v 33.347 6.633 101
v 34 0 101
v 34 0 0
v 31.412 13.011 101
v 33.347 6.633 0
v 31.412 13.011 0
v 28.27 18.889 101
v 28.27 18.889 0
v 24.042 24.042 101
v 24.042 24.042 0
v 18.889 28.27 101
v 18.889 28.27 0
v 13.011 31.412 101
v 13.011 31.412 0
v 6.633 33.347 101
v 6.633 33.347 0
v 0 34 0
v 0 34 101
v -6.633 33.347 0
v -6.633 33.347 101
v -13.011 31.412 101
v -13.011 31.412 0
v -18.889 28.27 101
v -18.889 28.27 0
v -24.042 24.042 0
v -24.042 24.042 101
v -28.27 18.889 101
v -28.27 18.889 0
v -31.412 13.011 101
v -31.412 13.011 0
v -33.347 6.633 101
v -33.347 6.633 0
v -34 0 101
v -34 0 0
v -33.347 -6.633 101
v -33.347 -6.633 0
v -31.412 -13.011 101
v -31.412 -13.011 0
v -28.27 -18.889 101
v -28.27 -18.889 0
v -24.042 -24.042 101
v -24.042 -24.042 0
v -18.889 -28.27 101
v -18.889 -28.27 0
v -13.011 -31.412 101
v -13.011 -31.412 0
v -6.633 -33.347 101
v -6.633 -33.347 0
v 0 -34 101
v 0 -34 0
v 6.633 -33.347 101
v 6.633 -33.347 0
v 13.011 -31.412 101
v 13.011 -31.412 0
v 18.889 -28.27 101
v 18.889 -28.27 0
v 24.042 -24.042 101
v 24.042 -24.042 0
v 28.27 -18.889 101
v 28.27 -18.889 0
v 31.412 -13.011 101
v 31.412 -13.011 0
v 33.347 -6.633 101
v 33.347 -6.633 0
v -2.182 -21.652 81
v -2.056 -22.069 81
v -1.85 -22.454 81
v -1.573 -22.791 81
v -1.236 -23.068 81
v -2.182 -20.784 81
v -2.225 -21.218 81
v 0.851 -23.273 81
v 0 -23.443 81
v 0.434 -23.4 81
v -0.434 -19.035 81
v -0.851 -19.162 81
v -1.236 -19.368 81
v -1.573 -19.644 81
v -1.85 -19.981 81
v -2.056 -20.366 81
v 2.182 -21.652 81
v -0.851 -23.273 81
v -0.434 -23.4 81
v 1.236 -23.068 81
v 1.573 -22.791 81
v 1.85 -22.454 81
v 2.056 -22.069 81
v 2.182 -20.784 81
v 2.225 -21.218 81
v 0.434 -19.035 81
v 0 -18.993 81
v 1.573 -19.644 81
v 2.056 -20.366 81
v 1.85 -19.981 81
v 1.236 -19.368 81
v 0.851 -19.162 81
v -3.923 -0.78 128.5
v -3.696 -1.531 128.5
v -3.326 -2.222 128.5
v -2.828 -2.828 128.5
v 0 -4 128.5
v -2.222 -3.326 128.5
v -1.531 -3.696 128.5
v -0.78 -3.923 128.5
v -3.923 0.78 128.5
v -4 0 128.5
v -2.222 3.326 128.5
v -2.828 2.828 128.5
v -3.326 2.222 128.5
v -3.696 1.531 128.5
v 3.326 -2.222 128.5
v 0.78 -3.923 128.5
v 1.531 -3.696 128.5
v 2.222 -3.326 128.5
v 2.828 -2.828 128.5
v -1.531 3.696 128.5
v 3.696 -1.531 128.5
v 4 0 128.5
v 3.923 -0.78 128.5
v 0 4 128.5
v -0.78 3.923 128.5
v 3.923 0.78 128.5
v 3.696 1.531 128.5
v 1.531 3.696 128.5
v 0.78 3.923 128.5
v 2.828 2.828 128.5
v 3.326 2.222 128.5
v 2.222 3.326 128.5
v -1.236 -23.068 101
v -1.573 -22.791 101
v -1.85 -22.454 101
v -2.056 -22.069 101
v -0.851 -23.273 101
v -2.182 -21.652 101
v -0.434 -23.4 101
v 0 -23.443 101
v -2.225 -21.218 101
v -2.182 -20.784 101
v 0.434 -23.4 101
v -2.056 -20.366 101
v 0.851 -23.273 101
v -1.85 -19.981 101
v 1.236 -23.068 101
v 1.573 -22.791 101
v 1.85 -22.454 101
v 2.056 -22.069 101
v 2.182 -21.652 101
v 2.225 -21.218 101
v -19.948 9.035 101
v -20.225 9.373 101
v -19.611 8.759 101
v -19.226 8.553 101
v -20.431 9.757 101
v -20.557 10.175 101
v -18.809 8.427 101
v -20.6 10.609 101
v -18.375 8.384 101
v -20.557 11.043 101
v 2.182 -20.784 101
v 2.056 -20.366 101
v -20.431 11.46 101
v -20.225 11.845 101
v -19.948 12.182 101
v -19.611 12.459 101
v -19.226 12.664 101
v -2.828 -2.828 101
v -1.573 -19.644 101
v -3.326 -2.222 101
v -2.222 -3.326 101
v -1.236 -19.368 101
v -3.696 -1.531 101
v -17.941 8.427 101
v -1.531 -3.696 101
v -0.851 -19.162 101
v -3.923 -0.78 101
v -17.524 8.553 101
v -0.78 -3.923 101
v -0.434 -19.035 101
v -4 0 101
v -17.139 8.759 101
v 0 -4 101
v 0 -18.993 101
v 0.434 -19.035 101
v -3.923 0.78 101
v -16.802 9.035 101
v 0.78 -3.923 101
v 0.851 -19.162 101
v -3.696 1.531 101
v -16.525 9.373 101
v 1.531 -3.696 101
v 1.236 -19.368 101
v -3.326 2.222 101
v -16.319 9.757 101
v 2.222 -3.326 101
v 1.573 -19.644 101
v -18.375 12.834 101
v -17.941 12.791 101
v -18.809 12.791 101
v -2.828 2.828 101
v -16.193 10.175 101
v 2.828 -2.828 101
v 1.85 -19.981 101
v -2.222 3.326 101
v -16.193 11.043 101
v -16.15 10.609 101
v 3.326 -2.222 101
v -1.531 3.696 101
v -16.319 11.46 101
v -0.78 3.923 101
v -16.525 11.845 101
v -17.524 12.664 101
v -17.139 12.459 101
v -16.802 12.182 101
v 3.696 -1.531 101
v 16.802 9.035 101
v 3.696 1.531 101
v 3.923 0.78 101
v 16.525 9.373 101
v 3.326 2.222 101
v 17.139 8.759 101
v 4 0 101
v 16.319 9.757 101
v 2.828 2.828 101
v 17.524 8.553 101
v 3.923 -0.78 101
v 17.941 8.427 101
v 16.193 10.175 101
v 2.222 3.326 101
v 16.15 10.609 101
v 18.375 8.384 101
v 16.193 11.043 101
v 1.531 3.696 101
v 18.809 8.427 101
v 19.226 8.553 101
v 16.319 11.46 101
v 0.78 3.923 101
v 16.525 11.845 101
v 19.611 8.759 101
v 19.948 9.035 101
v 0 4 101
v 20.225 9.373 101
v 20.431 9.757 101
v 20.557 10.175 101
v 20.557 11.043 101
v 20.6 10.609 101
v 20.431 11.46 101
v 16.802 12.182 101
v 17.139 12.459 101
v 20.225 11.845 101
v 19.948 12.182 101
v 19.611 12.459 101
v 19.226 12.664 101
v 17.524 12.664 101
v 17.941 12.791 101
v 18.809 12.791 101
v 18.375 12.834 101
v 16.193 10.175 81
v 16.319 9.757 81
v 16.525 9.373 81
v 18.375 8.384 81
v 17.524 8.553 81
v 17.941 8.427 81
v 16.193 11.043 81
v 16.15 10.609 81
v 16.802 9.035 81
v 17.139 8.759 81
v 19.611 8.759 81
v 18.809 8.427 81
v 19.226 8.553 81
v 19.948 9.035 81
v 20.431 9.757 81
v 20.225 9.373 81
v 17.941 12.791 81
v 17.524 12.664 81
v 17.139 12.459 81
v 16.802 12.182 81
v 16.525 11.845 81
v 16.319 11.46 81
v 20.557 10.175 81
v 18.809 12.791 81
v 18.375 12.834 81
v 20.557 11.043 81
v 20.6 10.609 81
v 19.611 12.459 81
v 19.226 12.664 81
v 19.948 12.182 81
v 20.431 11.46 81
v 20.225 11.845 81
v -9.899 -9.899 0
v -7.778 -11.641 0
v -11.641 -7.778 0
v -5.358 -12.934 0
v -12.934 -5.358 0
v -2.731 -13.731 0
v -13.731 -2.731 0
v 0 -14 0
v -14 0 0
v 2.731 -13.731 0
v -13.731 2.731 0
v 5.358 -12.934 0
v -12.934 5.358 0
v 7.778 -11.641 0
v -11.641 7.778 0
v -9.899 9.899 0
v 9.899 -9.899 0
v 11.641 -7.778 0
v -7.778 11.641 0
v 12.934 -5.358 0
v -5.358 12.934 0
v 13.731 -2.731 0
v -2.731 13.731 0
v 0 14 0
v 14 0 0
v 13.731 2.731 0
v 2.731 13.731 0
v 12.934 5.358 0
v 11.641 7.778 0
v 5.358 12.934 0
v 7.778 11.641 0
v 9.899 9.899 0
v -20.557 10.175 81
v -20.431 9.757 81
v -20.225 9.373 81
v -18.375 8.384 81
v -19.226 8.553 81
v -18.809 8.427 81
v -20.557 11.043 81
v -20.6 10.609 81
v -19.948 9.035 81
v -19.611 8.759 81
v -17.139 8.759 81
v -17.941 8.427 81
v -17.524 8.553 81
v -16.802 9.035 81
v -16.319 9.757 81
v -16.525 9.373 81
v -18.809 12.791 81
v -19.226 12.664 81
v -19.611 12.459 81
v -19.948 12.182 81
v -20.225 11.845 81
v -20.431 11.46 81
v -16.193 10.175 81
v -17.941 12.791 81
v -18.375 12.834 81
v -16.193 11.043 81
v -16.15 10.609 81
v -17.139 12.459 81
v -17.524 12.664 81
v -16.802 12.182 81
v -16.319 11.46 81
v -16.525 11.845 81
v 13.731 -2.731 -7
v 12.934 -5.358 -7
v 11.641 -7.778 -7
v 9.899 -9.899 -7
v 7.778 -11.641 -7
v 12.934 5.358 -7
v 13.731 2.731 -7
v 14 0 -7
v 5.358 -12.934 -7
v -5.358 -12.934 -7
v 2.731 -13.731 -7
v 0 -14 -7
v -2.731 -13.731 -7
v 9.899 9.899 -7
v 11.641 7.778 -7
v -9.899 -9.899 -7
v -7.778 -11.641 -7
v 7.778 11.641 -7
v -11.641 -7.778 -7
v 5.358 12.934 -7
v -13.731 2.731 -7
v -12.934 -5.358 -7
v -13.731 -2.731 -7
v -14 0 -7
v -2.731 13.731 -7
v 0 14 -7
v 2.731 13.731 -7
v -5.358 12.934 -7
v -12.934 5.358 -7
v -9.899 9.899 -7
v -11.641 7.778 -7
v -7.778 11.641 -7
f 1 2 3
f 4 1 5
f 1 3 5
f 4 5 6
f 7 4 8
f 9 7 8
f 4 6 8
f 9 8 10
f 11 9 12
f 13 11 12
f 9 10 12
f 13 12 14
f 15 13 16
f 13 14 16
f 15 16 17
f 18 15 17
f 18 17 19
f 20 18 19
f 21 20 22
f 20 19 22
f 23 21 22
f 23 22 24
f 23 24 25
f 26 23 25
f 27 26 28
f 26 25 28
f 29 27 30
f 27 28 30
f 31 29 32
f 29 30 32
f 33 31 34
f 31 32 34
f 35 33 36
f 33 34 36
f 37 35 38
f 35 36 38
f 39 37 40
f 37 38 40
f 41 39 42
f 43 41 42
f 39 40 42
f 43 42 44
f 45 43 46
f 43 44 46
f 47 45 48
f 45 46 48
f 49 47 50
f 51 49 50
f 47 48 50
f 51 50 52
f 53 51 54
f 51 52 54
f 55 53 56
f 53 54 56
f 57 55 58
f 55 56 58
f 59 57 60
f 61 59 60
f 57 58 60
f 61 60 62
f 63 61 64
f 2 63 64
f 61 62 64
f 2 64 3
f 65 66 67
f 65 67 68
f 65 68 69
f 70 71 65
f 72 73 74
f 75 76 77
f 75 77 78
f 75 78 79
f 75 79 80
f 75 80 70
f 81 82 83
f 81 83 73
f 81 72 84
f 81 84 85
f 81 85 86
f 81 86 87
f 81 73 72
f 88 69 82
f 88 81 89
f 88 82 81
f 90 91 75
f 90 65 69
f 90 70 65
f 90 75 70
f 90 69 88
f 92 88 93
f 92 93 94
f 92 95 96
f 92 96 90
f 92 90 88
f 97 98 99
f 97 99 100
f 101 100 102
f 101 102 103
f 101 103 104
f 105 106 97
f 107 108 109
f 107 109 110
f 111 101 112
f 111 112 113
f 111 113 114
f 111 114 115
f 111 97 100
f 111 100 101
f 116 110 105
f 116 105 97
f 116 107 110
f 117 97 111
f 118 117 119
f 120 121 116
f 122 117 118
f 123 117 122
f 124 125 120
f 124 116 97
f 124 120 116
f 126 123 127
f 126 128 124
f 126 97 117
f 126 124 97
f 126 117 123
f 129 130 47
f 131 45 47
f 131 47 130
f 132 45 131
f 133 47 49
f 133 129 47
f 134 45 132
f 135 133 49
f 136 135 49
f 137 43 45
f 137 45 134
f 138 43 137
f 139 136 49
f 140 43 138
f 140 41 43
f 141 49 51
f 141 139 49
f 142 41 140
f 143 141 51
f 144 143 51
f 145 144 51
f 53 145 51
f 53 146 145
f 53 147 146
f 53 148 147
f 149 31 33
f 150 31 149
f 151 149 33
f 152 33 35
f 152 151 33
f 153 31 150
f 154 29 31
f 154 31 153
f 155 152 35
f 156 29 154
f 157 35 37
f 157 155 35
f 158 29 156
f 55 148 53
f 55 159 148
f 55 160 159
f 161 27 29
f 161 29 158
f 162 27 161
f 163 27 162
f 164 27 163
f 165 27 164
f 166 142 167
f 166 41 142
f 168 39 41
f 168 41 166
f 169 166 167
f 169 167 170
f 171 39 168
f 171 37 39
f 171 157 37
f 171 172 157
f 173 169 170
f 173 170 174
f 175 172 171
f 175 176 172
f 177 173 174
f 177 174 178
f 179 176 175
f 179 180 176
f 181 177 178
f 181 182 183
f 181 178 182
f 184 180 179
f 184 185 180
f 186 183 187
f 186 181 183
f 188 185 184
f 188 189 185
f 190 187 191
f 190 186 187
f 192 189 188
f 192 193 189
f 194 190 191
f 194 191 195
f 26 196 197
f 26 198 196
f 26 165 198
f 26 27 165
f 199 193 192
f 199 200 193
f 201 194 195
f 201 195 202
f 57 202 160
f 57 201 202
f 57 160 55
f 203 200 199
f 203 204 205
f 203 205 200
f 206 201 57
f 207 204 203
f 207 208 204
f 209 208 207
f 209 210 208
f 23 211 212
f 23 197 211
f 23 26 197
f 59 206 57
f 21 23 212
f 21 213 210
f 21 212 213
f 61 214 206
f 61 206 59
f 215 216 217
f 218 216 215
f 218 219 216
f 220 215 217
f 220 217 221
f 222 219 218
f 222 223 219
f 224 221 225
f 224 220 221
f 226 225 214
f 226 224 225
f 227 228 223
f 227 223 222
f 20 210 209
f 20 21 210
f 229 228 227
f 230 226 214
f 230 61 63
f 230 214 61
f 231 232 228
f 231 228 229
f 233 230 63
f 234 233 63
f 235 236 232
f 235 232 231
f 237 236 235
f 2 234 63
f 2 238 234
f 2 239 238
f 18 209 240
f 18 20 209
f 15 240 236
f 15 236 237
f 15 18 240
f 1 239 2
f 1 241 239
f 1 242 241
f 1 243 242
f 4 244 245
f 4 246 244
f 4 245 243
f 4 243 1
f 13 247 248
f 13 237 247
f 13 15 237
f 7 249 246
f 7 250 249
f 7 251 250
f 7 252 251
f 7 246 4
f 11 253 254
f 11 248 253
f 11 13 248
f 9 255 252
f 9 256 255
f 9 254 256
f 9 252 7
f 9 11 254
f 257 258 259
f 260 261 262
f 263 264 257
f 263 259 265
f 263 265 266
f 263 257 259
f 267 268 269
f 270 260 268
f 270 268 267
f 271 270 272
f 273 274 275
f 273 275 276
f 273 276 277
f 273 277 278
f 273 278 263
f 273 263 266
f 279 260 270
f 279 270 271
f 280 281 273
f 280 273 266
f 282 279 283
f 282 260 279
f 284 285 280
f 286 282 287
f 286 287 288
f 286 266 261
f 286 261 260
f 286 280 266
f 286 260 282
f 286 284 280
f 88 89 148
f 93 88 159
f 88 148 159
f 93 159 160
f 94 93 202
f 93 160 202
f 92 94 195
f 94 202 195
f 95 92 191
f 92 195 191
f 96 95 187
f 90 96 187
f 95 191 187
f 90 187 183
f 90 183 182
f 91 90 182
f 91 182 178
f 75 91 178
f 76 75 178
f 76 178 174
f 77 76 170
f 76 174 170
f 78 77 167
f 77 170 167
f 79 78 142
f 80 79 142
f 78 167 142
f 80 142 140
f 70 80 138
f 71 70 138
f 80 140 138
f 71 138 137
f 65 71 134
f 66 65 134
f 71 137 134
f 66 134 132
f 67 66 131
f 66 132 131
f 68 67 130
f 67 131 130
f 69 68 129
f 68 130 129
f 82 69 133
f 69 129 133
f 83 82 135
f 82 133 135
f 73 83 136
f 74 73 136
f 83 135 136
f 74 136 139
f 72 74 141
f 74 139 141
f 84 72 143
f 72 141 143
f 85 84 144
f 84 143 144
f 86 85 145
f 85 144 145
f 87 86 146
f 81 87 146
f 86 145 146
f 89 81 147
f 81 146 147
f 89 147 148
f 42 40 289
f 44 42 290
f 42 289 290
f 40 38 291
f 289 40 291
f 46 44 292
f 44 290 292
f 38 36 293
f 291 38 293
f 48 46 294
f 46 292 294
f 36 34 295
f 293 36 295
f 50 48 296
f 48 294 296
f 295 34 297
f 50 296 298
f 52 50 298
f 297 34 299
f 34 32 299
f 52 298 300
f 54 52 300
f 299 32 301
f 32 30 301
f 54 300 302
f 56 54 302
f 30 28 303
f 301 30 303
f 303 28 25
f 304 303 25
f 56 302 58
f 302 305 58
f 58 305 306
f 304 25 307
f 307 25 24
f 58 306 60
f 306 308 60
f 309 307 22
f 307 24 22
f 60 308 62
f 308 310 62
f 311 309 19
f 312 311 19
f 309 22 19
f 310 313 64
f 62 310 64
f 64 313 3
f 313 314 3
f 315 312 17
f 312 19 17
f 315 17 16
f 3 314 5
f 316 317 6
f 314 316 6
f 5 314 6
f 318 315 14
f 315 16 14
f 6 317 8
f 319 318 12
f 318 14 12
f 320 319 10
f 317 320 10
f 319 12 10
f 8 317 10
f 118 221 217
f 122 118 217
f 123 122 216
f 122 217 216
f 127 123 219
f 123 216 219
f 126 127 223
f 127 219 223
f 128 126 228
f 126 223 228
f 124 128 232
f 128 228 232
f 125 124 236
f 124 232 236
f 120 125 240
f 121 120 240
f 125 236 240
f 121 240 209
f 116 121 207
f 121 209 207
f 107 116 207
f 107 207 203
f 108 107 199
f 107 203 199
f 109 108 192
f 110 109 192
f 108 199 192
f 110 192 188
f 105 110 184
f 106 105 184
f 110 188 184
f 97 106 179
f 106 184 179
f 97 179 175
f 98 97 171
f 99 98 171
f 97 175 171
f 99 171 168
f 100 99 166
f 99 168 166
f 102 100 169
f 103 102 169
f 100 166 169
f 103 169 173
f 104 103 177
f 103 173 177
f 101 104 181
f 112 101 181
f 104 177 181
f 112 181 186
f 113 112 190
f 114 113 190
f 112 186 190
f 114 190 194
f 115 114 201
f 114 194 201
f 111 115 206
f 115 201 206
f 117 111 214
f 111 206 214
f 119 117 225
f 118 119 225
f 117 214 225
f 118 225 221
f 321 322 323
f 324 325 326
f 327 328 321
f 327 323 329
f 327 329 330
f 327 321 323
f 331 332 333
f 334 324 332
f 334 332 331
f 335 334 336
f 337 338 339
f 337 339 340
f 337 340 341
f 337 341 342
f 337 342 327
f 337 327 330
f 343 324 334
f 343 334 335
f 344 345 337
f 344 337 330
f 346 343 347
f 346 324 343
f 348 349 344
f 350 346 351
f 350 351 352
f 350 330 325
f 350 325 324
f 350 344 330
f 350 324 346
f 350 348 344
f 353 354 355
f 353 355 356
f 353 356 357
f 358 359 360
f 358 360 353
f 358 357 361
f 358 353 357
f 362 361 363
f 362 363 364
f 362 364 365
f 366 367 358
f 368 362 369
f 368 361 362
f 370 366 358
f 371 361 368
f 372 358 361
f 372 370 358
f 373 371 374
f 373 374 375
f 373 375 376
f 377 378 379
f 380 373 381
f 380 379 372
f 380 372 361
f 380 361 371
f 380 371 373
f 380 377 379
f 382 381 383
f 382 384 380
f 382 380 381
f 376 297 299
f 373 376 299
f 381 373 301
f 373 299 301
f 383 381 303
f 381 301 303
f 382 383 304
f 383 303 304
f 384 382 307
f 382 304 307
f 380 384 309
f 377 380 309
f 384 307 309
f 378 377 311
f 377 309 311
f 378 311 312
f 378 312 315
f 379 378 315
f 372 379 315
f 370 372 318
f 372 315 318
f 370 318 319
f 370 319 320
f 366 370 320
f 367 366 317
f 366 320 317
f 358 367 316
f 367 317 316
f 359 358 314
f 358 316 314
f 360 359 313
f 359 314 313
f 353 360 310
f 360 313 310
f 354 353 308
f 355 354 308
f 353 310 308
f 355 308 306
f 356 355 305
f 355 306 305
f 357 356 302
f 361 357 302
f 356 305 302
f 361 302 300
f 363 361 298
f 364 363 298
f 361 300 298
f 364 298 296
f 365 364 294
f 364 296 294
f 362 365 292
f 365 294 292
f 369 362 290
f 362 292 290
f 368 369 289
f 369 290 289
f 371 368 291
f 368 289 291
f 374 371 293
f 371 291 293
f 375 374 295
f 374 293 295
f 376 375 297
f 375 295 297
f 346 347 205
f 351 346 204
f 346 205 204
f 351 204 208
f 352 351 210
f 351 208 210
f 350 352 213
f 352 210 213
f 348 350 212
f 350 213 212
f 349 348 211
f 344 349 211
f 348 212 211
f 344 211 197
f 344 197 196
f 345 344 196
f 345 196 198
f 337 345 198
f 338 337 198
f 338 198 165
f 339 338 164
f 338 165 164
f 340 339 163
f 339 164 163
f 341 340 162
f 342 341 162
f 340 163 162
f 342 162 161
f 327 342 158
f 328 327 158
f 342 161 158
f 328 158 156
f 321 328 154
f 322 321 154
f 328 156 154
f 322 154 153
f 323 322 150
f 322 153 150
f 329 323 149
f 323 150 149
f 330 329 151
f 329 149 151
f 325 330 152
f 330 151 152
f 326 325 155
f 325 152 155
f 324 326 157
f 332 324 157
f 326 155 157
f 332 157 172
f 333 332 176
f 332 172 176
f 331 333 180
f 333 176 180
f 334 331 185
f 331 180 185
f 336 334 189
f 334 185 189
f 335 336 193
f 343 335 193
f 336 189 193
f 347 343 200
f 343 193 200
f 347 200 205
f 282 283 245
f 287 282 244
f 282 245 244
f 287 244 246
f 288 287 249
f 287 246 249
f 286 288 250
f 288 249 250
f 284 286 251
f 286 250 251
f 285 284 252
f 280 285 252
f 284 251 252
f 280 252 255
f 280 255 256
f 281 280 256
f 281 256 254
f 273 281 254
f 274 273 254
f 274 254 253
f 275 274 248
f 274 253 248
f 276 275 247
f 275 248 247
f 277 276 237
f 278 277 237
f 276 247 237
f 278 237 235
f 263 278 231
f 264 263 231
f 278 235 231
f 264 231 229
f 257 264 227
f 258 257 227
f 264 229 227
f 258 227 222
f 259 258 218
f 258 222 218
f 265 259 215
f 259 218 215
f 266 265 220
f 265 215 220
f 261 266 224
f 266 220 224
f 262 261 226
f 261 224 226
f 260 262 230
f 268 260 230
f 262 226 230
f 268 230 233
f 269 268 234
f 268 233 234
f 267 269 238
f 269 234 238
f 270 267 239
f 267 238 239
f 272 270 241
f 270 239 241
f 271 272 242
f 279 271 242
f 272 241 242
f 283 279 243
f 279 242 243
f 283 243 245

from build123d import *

# Parameters (mm, degrees)
SKETCH1_R           = 34
BOSS_EXTRUDE1_DEPTH = 101
SKETCH2_R           = 4
BOSS_EXTRUDE2_DEPTH = 27.5
SKETCH3_R           = 2.225
CUT_EXTRUDE1_DEPTH  = 20
SKETCH4_R           = 14
BOSS_EXTRUDE3_DEPTH = 7


with BuildPart() as part:
    # Sketch1 → Boss-Extrude1 (new body)
    with BuildSketch(Plane.XY):
        Circle(SKETCH1_R)
    extrude(amount=BOSS_EXTRUDE1_DEPTH)

    # Sketch2 → Boss-Extrude2 (add)
    with BuildSketch(Plane.XY.offset(101)):
        Circle(SKETCH2_R)
    extrude(amount=BOSS_EXTRUDE2_DEPTH)

    # Sketch3 → Cut-Extrude1 (cut)
    with BuildSketch(Plane.XY.offset(101)):
        with Locations((-18.375, 10.608811196)):
            Circle(SKETCH3_R)
        with Locations((18.375, 10.608811196)):
            Circle(SKETCH3_R)
        with Locations((0, -21.217622393)):
            Circle(SKETCH3_R)
    extrude(amount=-CUT_EXTRUDE1_DEPTH, mode=Mode.SUBTRACT)

    # Sketch4 → Boss-Extrude3 (add)
    with BuildSketch(Plane(origin=(0, 0, 0), x_dir=(-1, 0, 0), z_dir=(0, 0, -1))):
        Circle(SKETCH4_R)
    extrude(amount=BOSS_EXTRUDE3_DEPTH)


solid = part.part
